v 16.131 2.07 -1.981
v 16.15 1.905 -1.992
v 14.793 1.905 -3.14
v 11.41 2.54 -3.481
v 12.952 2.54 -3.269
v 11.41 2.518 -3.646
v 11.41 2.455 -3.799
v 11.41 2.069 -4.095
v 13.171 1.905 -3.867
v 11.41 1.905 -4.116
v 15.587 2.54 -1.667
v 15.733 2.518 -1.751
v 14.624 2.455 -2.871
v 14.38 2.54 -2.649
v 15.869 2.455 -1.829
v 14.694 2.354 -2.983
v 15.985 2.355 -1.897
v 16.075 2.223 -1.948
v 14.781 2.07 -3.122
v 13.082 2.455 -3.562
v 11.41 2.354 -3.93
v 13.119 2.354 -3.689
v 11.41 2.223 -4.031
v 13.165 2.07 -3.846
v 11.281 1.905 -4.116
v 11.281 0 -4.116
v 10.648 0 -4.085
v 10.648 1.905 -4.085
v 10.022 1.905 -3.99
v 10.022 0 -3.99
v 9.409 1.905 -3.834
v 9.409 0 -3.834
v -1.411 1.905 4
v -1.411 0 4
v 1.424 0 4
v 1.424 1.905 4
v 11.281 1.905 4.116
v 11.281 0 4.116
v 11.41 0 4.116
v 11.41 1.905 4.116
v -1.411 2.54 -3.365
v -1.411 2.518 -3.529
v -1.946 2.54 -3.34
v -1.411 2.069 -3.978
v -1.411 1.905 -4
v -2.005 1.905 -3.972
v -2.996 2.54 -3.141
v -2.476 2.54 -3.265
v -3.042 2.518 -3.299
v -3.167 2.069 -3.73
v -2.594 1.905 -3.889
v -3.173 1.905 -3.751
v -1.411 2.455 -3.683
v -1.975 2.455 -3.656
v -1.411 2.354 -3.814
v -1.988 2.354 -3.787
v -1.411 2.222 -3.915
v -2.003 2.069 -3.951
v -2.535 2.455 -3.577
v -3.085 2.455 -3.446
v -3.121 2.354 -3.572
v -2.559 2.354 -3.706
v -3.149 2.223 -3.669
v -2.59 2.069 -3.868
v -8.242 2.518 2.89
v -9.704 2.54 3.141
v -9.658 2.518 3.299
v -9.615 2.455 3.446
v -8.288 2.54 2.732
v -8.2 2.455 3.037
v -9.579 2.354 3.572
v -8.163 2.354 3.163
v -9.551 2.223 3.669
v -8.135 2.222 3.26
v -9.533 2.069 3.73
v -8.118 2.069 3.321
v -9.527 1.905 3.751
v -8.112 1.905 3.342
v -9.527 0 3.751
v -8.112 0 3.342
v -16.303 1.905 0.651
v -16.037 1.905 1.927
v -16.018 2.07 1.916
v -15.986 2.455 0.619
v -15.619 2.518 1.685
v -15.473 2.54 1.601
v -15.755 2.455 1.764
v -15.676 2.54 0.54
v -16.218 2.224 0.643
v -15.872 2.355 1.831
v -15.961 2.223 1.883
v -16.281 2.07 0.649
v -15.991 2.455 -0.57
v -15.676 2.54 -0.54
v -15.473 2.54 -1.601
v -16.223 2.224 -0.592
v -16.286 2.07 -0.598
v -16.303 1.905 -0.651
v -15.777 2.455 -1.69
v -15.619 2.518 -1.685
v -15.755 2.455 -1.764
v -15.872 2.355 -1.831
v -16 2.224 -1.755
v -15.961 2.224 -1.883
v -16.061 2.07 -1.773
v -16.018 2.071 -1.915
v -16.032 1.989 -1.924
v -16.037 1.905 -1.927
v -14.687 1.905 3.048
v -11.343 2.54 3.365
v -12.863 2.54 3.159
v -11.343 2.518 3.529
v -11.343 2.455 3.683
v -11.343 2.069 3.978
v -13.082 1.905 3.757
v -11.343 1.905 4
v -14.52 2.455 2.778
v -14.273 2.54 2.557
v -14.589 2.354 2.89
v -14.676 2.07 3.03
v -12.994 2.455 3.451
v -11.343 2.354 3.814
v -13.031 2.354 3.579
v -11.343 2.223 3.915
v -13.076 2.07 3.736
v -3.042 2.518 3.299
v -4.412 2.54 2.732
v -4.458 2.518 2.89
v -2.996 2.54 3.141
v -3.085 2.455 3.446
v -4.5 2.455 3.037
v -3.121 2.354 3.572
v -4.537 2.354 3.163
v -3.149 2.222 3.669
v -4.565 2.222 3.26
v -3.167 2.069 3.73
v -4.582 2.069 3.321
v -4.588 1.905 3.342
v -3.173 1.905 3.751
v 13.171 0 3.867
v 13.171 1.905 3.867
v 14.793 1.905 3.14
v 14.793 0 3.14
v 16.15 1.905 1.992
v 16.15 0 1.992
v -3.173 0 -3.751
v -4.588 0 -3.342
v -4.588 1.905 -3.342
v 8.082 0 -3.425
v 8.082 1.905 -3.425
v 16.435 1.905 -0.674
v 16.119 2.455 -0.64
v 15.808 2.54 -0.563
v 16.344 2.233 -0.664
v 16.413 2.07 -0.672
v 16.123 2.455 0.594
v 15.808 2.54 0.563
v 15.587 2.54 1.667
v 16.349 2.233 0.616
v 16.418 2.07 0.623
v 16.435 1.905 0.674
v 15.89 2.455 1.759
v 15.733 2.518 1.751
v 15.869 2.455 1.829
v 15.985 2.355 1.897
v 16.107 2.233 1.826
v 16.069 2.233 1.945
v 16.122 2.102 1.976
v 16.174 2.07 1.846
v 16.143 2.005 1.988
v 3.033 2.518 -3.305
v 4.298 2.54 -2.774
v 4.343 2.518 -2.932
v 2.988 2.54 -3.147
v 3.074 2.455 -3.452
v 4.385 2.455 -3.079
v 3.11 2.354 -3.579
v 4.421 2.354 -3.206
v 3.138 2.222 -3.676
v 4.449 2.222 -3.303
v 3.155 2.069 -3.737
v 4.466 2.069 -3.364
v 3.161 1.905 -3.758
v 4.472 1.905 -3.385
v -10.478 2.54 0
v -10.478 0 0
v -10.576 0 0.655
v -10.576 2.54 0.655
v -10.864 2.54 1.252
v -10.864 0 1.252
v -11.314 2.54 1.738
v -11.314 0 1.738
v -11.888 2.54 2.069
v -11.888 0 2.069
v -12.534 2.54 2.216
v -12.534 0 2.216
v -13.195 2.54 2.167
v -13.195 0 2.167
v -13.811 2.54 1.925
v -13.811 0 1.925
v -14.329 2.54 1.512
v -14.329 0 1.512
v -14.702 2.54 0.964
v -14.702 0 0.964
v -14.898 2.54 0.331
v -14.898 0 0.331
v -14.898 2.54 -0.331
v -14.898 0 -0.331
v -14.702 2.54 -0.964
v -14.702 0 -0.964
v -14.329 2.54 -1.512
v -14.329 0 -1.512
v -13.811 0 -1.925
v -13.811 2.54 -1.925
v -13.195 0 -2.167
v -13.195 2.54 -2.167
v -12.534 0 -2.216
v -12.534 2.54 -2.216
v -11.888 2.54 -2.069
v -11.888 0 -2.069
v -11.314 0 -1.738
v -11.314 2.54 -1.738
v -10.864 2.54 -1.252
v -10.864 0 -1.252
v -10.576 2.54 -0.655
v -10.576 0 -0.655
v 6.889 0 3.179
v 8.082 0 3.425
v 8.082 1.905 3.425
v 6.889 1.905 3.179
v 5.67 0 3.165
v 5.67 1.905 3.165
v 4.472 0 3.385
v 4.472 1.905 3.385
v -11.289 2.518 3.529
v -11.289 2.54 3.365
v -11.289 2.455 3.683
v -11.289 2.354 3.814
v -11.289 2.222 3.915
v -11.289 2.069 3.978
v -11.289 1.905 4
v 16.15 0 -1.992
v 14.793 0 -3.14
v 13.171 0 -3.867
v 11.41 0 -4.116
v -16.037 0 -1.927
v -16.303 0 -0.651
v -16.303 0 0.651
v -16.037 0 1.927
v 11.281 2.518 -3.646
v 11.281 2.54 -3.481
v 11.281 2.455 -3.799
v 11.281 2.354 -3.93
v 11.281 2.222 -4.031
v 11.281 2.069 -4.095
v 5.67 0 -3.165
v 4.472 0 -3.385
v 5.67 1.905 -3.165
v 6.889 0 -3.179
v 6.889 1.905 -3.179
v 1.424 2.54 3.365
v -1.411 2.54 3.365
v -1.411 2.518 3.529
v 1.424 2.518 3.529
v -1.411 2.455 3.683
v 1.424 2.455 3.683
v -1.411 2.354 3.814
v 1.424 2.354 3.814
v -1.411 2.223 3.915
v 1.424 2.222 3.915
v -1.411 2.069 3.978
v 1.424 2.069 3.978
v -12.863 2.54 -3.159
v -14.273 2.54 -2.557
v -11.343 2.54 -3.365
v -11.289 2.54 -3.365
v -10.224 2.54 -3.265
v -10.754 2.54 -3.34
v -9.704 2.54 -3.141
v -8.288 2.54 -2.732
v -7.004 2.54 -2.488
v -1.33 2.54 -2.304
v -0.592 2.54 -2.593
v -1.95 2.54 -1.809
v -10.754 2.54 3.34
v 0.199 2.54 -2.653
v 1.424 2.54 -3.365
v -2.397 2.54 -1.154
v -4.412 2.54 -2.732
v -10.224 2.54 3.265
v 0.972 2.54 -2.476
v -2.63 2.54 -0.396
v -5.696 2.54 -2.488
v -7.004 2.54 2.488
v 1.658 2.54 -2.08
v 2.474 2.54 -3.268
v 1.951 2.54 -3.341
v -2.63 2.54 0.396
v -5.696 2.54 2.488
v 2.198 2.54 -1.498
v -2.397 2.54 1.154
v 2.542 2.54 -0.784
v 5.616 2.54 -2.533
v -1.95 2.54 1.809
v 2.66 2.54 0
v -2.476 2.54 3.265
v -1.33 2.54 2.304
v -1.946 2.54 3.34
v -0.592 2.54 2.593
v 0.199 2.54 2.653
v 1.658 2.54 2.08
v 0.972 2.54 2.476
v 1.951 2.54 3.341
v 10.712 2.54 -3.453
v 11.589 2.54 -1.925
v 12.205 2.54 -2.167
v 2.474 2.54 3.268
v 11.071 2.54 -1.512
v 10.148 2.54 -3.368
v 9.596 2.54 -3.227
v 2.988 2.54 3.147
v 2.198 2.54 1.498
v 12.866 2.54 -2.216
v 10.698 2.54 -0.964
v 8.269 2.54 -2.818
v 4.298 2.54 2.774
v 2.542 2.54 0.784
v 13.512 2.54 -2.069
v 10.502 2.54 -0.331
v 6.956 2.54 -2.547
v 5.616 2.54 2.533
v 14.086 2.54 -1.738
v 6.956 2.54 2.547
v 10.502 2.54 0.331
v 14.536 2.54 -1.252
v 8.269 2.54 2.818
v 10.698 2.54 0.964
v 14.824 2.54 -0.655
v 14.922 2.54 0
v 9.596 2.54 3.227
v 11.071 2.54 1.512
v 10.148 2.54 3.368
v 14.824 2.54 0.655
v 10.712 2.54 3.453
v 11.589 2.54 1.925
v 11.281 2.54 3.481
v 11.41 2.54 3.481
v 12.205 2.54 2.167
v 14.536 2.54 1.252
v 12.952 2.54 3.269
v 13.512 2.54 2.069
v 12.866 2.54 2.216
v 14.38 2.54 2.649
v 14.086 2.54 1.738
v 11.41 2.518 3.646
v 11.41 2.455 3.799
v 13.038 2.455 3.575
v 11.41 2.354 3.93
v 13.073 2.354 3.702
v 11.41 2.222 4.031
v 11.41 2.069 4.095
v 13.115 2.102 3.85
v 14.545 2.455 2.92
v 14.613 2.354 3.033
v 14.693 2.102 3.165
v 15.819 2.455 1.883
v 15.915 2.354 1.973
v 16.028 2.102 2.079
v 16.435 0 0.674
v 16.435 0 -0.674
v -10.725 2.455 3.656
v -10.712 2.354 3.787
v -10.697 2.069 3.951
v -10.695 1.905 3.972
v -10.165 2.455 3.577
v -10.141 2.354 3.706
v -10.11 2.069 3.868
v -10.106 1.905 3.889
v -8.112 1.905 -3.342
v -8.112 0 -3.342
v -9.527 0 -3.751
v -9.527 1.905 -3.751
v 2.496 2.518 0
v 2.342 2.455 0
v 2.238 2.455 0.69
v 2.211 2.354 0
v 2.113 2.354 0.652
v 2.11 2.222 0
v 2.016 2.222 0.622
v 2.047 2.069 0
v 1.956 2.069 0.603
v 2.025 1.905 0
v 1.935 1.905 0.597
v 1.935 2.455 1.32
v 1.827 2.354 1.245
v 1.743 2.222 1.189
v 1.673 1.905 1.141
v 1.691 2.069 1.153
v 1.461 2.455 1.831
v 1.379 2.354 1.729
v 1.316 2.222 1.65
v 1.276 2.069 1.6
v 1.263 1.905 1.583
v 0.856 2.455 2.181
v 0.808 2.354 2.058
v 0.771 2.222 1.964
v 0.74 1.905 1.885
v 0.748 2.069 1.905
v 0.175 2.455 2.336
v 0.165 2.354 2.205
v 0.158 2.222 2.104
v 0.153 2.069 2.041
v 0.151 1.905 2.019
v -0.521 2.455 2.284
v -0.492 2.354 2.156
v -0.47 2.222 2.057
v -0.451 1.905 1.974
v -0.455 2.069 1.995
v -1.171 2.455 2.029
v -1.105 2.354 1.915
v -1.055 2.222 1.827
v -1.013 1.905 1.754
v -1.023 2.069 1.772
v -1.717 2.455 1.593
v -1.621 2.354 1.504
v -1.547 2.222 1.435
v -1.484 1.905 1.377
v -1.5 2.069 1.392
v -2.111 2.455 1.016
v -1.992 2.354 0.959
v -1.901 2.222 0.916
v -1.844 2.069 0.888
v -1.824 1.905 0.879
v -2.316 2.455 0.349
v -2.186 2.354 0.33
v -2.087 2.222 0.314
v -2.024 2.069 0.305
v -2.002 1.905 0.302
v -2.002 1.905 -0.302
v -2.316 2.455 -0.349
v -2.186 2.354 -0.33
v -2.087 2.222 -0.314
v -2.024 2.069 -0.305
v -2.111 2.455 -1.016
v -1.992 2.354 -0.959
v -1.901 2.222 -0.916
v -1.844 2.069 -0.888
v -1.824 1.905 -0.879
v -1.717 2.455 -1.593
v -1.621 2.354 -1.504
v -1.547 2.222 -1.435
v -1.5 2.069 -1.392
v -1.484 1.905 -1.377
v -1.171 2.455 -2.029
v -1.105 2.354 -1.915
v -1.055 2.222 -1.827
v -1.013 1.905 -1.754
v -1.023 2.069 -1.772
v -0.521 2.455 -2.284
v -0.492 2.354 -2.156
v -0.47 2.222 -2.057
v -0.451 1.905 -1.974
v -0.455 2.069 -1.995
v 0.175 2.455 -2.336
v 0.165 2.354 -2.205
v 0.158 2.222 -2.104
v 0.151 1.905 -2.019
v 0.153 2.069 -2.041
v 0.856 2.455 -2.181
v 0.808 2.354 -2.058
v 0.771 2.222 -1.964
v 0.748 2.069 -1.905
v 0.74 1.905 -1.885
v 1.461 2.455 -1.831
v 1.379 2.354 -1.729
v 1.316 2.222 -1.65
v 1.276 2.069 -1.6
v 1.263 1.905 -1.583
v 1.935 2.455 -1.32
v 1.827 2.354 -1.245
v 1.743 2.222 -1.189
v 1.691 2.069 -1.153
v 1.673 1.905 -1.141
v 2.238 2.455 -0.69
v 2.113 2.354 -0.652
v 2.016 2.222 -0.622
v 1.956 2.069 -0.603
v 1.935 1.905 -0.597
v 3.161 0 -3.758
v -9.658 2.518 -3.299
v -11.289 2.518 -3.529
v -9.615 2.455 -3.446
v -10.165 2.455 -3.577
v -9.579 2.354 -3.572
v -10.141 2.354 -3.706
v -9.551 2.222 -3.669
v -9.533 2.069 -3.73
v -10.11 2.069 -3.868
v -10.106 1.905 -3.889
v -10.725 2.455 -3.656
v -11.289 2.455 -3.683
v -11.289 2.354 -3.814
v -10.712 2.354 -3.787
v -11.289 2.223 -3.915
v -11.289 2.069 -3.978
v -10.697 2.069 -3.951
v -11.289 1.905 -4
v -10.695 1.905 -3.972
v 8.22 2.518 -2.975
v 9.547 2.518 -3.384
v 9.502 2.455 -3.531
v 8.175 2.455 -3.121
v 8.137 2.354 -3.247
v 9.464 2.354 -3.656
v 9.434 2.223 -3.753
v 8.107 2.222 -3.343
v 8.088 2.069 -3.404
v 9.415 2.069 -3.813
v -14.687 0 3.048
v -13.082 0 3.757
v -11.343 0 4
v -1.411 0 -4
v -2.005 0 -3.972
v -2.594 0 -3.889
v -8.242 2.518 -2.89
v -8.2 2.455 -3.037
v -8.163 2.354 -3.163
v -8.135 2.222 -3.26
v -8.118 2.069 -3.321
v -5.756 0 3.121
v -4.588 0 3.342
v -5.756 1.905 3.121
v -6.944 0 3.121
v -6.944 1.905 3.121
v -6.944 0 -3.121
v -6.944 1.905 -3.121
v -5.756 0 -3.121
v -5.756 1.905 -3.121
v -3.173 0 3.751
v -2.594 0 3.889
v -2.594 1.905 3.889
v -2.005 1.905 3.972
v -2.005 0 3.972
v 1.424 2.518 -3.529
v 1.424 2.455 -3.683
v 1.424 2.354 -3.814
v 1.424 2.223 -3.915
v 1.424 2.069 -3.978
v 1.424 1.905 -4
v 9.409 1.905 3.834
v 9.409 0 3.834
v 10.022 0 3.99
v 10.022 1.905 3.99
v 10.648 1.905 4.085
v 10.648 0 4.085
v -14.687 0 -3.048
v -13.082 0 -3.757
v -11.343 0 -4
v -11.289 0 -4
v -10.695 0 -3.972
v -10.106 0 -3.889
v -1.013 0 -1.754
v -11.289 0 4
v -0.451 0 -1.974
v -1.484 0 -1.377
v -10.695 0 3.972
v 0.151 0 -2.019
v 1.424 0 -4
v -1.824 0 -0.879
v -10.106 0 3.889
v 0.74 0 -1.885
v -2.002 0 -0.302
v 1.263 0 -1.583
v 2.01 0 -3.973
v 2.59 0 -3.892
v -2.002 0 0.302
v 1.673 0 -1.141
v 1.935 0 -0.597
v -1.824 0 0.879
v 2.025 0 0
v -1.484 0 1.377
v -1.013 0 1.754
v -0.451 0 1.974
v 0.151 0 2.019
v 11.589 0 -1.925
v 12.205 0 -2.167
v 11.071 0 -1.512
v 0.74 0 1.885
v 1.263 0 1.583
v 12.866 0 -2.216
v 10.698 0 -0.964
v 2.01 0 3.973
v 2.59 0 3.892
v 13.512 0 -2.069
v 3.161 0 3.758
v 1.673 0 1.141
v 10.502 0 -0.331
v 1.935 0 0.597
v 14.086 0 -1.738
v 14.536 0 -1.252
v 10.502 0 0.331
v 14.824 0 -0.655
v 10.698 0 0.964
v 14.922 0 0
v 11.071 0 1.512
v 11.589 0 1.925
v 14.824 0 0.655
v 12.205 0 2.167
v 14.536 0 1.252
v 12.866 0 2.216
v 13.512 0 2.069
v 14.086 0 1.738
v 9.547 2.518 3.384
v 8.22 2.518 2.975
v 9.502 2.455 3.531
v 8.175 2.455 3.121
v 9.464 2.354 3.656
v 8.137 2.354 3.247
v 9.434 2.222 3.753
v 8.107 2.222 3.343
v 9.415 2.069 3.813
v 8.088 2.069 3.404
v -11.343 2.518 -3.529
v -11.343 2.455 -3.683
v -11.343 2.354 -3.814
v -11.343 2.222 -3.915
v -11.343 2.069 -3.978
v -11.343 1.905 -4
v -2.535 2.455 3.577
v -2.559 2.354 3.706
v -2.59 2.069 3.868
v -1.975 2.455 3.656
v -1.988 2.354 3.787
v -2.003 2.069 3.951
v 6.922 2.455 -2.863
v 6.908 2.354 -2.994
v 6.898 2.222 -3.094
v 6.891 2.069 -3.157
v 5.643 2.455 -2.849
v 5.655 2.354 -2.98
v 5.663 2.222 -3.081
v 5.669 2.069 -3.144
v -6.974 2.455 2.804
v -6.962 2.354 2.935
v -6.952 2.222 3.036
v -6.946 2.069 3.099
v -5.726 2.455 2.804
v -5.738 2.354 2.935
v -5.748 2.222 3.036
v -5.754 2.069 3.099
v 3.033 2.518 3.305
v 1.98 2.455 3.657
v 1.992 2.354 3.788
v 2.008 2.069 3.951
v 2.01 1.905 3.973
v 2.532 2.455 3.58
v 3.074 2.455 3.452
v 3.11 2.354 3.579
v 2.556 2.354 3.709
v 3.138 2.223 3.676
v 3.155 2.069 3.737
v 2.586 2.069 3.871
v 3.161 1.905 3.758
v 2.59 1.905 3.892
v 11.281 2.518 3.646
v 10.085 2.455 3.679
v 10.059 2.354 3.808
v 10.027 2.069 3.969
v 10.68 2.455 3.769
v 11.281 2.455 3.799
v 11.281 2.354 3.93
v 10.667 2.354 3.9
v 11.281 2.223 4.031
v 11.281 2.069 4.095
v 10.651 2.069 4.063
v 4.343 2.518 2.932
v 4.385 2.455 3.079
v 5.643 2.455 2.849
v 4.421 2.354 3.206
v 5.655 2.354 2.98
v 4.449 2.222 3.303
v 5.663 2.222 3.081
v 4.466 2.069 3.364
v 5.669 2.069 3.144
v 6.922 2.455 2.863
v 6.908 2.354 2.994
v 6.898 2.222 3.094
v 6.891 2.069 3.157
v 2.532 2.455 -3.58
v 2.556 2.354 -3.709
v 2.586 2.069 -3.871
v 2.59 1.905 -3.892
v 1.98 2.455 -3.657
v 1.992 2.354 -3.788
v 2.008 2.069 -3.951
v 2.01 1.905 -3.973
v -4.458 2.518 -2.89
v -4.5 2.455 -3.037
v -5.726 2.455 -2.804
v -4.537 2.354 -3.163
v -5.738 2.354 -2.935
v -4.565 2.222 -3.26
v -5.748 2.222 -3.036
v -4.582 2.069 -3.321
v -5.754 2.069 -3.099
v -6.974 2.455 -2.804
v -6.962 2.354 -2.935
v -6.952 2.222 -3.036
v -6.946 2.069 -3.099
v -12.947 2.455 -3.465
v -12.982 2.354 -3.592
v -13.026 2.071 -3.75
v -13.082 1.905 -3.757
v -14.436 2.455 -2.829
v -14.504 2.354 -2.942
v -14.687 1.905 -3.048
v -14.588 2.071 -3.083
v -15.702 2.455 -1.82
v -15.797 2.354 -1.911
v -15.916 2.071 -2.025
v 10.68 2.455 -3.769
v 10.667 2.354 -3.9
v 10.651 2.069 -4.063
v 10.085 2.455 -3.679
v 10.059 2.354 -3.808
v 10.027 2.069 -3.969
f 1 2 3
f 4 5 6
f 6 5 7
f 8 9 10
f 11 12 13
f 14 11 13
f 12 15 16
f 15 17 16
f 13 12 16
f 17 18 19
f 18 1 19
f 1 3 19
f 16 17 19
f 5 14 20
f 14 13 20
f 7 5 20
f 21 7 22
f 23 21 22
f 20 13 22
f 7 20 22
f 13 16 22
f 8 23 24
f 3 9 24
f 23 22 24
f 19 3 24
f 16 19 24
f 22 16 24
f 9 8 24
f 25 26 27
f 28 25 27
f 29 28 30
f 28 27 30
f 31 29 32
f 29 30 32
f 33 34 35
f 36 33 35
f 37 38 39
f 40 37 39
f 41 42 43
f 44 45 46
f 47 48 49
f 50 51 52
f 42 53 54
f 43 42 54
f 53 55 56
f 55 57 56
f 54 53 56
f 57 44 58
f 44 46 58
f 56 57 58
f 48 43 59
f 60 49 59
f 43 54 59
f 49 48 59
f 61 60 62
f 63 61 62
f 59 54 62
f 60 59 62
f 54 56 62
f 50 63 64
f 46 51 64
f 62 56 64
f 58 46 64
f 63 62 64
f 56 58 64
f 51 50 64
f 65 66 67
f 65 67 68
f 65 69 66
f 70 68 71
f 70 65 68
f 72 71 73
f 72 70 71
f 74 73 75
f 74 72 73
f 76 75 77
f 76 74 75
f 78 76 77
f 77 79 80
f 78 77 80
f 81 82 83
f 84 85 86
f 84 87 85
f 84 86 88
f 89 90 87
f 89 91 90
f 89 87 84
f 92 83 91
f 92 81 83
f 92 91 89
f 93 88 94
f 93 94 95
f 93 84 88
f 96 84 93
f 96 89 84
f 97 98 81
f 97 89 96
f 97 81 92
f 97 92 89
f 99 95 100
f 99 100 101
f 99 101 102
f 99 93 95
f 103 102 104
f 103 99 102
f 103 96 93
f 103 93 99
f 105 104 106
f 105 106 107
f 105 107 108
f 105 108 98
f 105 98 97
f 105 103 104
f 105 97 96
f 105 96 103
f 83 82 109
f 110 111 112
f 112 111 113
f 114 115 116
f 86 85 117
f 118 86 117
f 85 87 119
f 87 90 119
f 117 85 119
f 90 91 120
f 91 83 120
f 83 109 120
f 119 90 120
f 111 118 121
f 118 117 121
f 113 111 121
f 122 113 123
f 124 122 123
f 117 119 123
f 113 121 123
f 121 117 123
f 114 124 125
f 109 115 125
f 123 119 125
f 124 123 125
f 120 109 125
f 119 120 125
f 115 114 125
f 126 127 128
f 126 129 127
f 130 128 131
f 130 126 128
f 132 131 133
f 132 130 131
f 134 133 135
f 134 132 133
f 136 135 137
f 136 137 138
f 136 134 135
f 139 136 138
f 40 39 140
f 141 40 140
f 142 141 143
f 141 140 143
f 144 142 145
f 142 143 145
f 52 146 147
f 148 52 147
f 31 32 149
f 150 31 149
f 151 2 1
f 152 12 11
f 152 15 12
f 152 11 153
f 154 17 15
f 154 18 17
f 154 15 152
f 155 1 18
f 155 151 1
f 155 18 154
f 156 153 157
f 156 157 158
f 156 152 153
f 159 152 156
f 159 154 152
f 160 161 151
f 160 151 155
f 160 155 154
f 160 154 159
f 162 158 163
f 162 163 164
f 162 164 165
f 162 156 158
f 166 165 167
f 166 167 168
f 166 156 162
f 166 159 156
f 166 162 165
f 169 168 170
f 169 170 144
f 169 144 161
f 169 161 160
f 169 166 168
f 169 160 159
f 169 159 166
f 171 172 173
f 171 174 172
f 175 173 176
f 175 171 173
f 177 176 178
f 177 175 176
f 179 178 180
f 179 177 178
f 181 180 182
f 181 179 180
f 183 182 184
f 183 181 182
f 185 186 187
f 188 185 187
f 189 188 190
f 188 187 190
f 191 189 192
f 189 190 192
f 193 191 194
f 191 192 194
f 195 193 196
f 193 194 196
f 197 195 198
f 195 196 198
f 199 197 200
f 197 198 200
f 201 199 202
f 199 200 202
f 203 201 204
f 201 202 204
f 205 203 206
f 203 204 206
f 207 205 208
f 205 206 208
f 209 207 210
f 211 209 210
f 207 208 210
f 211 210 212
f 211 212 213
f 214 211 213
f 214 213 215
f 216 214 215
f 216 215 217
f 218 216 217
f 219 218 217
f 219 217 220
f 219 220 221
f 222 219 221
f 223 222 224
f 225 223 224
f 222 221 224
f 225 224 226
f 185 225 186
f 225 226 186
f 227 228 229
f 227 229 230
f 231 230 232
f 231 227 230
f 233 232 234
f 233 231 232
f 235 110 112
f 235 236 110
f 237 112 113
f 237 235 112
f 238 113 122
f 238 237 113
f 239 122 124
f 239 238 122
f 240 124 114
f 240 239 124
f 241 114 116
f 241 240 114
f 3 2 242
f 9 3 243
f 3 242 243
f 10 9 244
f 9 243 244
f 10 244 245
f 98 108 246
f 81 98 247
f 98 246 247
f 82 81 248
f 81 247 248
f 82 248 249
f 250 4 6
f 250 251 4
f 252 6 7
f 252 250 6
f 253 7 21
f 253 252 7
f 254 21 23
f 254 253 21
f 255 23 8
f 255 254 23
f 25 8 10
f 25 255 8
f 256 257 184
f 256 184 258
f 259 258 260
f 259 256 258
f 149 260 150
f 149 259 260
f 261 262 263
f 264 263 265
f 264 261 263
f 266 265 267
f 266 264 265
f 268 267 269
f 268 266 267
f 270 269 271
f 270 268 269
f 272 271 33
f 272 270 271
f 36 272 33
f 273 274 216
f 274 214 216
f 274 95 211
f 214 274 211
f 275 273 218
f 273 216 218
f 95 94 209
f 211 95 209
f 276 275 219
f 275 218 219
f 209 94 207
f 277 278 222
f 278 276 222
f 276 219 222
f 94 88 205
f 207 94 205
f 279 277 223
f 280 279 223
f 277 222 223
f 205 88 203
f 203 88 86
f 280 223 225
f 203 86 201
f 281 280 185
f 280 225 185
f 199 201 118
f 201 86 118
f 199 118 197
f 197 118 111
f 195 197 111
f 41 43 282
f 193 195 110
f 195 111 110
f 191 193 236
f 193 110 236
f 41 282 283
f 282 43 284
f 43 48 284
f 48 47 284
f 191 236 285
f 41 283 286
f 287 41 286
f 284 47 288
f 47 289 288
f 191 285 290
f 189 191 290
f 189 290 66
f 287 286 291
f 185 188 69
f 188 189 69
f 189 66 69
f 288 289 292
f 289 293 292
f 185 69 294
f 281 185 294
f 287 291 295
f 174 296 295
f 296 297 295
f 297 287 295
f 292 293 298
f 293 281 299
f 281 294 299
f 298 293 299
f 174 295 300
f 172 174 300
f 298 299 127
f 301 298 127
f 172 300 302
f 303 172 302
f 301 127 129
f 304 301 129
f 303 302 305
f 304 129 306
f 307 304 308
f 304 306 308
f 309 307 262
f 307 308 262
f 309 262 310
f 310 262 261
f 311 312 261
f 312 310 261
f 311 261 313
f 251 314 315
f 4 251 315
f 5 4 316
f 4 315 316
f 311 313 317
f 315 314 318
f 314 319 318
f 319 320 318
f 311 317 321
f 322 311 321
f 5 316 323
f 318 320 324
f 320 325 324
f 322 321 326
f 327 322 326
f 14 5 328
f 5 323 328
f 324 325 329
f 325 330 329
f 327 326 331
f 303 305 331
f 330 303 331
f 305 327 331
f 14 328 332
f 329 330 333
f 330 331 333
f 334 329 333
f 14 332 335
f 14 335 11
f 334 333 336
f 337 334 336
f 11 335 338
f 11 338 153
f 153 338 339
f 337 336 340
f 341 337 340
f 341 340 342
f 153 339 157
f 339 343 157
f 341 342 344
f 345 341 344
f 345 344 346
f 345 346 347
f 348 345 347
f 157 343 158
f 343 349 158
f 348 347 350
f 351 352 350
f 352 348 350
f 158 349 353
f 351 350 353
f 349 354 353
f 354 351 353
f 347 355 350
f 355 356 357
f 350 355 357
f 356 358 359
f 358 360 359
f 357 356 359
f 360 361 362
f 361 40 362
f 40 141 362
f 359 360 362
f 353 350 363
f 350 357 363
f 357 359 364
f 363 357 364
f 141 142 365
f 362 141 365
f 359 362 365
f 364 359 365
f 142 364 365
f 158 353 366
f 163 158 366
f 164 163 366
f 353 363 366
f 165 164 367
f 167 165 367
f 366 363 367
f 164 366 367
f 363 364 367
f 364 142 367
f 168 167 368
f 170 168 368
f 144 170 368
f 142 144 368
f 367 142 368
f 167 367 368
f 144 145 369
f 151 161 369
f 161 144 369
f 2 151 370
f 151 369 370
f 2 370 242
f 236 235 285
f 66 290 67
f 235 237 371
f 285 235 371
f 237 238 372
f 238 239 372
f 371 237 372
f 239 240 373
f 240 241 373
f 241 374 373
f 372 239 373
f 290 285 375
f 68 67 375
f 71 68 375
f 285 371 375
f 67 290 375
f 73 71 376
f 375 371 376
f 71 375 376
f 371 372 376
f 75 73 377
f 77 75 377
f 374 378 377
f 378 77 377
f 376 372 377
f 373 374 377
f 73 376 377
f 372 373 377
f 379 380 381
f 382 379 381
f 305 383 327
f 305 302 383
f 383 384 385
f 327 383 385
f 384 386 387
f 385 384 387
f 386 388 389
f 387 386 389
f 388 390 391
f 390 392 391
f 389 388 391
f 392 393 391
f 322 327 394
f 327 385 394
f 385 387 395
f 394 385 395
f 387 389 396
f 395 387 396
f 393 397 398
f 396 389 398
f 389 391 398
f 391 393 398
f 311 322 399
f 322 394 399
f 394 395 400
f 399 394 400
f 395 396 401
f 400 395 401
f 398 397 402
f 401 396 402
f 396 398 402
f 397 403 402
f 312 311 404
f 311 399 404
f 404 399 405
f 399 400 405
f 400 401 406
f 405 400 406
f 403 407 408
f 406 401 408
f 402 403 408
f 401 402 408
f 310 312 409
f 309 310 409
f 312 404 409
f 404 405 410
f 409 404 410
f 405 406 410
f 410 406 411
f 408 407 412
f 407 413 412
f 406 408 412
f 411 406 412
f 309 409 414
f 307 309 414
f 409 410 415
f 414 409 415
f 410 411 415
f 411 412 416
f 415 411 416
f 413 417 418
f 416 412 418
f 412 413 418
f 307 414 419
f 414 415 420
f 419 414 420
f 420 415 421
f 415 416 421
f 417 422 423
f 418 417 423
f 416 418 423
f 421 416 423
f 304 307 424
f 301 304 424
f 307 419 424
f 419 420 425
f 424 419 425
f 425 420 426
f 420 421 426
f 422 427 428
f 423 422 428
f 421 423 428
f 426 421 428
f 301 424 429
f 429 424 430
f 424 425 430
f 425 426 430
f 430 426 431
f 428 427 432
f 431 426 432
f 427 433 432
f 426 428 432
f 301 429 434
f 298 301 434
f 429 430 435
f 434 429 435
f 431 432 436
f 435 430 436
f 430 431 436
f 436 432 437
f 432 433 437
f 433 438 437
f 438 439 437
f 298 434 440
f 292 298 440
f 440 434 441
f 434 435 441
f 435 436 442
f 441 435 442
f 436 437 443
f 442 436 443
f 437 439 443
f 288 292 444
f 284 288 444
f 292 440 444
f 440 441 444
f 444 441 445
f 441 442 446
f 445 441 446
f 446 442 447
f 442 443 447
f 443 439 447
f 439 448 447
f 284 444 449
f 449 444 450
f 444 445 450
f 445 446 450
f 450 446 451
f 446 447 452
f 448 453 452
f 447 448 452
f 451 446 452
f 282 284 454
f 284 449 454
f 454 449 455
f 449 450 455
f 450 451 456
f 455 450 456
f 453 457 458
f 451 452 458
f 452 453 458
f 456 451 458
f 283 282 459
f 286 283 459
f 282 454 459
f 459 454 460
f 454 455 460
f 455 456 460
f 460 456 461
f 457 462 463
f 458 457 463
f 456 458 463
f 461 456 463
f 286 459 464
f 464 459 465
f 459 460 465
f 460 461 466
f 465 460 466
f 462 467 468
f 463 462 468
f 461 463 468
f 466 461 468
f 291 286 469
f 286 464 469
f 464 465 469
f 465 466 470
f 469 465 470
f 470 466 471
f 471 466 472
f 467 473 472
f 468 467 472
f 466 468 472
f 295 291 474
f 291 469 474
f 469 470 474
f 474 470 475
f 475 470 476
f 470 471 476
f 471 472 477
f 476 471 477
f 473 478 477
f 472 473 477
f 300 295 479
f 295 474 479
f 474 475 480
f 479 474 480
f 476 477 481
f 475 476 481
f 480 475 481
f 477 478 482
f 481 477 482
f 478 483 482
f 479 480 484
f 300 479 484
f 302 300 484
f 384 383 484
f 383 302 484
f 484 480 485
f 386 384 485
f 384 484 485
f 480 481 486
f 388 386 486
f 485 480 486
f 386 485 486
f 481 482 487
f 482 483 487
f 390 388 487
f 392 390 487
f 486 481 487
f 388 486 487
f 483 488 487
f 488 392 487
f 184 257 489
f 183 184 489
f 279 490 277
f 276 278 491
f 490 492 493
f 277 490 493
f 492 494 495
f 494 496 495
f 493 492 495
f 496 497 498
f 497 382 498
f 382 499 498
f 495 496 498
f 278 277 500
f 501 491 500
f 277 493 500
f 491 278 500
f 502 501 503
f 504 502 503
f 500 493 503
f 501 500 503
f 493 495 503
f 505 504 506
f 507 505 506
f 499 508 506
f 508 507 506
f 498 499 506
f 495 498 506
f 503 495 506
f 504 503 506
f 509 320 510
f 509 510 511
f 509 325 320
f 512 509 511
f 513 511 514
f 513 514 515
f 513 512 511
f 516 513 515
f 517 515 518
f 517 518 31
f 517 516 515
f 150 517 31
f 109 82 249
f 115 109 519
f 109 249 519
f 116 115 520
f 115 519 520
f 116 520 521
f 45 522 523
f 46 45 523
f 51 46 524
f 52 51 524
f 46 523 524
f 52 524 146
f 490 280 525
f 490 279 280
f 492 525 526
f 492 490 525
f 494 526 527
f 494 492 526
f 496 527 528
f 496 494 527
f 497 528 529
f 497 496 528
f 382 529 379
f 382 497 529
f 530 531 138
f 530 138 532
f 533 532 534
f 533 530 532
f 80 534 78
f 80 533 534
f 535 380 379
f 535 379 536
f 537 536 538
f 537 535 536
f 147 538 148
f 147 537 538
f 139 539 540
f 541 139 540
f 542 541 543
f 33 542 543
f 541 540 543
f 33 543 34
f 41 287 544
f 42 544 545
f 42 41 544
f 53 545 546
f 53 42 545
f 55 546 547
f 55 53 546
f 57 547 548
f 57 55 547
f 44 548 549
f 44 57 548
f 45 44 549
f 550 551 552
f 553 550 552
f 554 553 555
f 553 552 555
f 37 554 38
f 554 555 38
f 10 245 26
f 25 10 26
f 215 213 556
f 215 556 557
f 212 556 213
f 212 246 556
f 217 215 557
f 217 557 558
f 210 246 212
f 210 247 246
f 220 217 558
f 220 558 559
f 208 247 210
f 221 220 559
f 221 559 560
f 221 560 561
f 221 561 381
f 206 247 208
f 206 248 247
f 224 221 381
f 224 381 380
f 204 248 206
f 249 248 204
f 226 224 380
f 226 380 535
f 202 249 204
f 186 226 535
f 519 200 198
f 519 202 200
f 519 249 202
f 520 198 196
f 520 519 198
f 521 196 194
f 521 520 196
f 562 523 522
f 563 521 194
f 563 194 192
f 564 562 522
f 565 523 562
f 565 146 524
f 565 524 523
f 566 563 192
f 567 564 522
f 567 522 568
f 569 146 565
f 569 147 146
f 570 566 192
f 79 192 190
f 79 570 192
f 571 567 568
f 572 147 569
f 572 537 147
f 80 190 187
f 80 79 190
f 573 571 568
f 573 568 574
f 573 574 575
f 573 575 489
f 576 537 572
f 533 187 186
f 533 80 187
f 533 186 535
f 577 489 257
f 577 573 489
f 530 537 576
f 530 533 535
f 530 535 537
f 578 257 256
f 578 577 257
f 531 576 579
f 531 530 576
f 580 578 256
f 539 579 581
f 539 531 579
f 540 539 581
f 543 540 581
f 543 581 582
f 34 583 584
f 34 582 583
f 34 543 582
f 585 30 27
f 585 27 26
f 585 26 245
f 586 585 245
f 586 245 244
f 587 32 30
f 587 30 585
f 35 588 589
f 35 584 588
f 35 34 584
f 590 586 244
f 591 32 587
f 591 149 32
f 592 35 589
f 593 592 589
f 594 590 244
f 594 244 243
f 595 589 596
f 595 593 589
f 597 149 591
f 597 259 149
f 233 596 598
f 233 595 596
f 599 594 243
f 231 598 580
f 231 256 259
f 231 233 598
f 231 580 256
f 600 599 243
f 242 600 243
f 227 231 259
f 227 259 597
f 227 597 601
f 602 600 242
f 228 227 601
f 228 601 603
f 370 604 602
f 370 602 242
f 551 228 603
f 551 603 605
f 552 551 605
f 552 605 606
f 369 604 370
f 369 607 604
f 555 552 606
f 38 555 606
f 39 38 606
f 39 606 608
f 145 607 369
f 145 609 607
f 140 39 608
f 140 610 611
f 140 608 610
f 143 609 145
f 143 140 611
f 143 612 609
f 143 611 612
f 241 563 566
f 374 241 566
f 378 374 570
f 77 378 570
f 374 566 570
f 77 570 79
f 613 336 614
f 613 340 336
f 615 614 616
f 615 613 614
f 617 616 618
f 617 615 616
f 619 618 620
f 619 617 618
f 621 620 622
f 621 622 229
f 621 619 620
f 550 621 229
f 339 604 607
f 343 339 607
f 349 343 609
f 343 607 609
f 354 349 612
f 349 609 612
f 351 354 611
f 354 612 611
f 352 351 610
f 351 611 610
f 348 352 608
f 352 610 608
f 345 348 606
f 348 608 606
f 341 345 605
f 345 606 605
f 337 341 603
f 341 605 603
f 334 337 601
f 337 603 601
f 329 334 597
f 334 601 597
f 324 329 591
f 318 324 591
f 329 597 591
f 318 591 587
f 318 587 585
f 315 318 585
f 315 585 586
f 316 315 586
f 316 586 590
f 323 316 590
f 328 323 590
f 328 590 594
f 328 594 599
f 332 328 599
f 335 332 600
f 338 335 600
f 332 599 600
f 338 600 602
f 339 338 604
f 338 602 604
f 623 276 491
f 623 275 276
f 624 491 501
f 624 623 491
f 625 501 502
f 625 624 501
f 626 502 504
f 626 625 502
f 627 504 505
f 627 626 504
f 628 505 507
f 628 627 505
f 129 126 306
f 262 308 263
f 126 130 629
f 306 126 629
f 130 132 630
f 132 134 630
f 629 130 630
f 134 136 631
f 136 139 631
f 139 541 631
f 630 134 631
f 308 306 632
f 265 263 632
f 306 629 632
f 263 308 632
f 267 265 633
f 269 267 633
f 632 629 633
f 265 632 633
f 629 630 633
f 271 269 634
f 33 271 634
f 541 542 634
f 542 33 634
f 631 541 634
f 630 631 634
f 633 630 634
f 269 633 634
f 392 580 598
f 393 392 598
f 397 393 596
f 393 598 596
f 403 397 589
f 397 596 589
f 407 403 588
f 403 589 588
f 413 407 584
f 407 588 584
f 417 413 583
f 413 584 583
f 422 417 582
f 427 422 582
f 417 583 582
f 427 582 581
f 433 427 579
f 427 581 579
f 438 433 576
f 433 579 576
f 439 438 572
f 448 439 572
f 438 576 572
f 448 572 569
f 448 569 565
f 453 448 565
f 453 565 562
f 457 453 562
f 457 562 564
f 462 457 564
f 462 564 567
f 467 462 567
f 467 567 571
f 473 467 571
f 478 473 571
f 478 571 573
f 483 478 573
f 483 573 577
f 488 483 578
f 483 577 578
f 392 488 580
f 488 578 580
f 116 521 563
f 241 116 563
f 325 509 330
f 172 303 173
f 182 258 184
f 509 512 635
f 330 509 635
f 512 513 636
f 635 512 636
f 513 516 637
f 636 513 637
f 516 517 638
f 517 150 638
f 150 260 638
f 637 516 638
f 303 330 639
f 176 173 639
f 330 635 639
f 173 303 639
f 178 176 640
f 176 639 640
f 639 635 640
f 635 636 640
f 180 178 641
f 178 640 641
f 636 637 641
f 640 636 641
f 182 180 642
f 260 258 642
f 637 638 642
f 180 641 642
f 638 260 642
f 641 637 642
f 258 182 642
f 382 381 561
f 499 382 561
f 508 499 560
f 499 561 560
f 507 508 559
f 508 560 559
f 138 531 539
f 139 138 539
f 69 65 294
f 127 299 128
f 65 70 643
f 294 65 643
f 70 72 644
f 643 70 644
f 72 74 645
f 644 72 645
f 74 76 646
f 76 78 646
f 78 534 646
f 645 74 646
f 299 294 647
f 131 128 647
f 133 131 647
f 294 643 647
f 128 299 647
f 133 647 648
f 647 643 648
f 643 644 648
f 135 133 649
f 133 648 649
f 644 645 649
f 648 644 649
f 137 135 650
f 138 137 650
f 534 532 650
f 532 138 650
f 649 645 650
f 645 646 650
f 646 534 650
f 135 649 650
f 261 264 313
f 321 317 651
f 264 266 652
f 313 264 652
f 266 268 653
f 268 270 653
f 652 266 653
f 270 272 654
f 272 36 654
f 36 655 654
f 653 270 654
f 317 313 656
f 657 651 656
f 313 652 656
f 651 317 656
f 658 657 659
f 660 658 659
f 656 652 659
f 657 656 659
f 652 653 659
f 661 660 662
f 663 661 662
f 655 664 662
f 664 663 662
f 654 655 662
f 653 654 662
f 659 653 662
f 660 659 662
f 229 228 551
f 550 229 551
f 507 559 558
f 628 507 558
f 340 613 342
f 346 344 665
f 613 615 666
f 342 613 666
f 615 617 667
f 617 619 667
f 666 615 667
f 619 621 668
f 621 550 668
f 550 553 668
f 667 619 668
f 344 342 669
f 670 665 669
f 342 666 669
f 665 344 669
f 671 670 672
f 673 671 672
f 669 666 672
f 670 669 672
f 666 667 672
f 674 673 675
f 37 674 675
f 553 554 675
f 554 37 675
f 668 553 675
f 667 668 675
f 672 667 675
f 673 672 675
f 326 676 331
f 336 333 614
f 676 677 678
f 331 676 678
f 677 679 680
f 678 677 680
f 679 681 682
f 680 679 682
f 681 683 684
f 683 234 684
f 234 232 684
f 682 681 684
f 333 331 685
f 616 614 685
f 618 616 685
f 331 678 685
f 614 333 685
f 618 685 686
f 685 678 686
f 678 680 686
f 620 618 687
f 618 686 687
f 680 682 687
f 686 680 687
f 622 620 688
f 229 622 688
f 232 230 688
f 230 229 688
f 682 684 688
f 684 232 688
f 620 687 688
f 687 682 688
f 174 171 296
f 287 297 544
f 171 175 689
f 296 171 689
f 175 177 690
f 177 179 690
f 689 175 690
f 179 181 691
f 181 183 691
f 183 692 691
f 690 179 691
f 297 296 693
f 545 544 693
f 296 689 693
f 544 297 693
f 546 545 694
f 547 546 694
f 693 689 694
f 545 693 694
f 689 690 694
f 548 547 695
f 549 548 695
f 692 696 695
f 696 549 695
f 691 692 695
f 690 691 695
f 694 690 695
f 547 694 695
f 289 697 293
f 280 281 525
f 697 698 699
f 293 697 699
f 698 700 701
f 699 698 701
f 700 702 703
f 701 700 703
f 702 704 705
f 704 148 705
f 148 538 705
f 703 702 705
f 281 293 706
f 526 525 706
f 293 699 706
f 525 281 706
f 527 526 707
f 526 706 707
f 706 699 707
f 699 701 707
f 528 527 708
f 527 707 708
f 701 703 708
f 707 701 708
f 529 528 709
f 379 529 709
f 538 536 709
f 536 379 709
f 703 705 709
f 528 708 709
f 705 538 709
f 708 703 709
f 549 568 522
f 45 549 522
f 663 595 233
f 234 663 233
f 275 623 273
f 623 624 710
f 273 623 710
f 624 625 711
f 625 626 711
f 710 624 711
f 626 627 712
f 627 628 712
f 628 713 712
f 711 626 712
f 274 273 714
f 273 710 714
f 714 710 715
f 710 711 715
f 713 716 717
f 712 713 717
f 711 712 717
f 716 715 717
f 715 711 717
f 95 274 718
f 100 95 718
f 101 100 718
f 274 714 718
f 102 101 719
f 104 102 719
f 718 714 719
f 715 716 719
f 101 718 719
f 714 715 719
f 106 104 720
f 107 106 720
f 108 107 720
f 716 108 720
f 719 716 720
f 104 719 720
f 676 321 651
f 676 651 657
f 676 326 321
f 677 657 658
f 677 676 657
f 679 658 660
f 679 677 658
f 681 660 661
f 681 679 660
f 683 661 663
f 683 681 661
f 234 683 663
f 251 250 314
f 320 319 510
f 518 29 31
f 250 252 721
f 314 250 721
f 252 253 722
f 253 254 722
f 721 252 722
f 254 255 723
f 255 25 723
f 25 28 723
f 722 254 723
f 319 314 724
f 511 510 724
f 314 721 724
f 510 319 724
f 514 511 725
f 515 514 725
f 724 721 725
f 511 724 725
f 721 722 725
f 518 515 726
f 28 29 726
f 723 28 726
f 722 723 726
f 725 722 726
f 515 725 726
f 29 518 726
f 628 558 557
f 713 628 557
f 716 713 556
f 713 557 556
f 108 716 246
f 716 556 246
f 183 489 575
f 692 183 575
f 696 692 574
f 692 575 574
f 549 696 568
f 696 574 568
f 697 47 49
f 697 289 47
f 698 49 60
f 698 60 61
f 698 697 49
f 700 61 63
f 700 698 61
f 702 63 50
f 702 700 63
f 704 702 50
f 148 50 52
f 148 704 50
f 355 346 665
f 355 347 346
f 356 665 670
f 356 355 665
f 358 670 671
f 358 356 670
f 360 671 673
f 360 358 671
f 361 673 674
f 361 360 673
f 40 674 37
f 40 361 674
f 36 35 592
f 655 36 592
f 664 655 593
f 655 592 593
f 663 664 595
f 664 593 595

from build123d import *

# Parameters (mm, degrees)
BOSS_EXTRUDE3_DEPTH = 2.54
FILLET1_R           = 6.35
FILLET2_R           = 0.635


with BuildPart() as part:
    # Sketch2 → Boss-Extrude3 (new body)
    with BuildSketch(Plane(origin=(0, 0, 0), x_dir=(1, 0, 0), z_dir=(0, 1, 0))):
        with BuildLine():
            ThreePointArc((-14.9225, 0), (-12.7, 2.2225), (-10.4775, 0))
            Line((-10.4775, 0), (-8.081142289, 0))
            Line((-8.081142289, 0), (-9.450372471, 2.371576242))
            Line((-9.450372471, 2.371576242), (-10.390571145, 4.000048114))
            Line((-10.390571145, 4.000048114), (-15.009428855, 4.000048114))
            Line((-15.009428855, 4.000048114), (-17.318857711, 0))
            Line((-17.318857711, 0), (-14.9225, 0))
        make_face()
        with BuildLine():
            Line((-8.081142289, 0), (-10.4775, 0))
            ThreePointArc((-10.4775, 0), (-12.7, -2.2225), (-14.9225, 0))
            Line((-14.9225, 0), (-17.318857711, 0))
            Line((-17.318857711, 0), (-15.009428855, -4.000048114))
            Line((-15.009428855, -4.000048114), (-10.390571145, -4.000048114))
            Line((-10.390571145, -4.000048114), (-9.235856717, -2.000024057))
            Line((-9.235856717, -2.000024057), (-8.081142289, 0))
        make_face()
        Polygon((-9.450372471, 2.371576242), (-8.081142289, 0), (-4.618857711, 0), (-3.464143283, 2.000024057), (-2.309428855, 4.000048114), (-6.35, 2.833322689), (-10.390571145, 4.000048114), align=None)
        Polygon((-4.618857711, 0), (-8.081142289, 0), (-9.235856717, -2.000024057), (-10.390571145, -4.000048114), (-6.35, -2.833322689), (-2.309428855, -4.000048114), (-3.464143283, -2.000024057), align=None)
        with BuildLine():
            Line((-3.464143283, 2.000024057), (-4.618857711, 0))
            Line((-4.618857711, 0), (-2.025, 0))
            ThreePointArc((-2.025, 0), (0, 2.025), (2.025, 0))
            Line((2.025, 0), (4.618857711, 0))
            Line((4.618857711, 0), (3.464143283, 2.000024057))
            Line((3.464143283, 2.000024057), (2.309428855, 4.000048114))
            Line((2.309428855, 4.000048114), (-2.309428855, 4.000048114))
            Line((-2.309428855, 4.000048114), (-3.464143283, 2.000024057))
        make_face()
        with BuildLine():
            Line((-2.025, 0), (-4.618857711, 0))
            Line((-4.618857711, 0), (-3.464143283, -2.000024057))
            Line((-3.464143283, -2.000024057), (-2.309428855, -4.000048114))
            Line((-2.309428855, -4.000048114), (2.309428855, -4.000048114))
            Line((2.309428855, -4.000048114), (3.464143283, -2.000024057))
            Line((3.464143283, -2.000024057), (4.618857711, 0))
            Line((4.618857711, 0), (2.025, 0))
            ThreePointArc((2.025, 0), (0, -2.025), (-2.025, 0))
        make_face()
        Polygon((3.464143283, 2.000024057), (4.618857711, 0), (7.946932116, 0), (9.135199087, 2.058138767), (10.323466058, 4.116277534), (6.282791089, 2.86963953), (2.309428855, 4.000048114), align=None)
        Polygon((7.946932116, 0), (4.618857711, 0), (3.464143283, -2.000024057), (2.309428855, -4.000048114), (6.282791089, -2.86963953), (10.323466058, -4.116277534), (9.135199087, -2.058138767), align=None)
        with BuildLine():
            Line((9.135199087, 2.058138767), (7.946932116, 0))
            Line((7.946932116, 0), (10.4775, 0))
            ThreePointArc((10.4775, 0), (12.7, 2.2225), (14.9225, 0))
            Line((14.9225, 0), (17.453067884, 0))
            Line((17.453067884, 0), (15.076533942, 4.116277534))
            Line((15.076533942, 4.116277534), (10.323466058, 4.116277534))
            Line((10.323466058, 4.116277534), (9.135199087, 2.058138767))
        make_face()
        with BuildLine():
            Line((10.4775, 0), (7.946932116, 0))
            Line((7.946932116, 0), (9.135199087, -2.058138767))
            Line((9.135199087, -2.058138767), (10.323466058, -4.116277534))
            Line((10.323466058, -4.116277534), (15.076533942, -4.116277534))
            Line((15.076533942, -4.116277534), (17.453067884, 0))
            Line((17.453067884, 0), (14.9225, 0))
            ThreePointArc((14.9225, 0), (12.7, -2.2225), (10.4775, 0))
        make_face()
    extrude(amount=BOSS_EXTRUDE3_DEPTH)

    # Fillet1
    # the kernel refuses this fillet: 6.35 mm, written as the material it adds along each edge
    with BuildSketch(Plane(origin=(-6.35, 0, -2.833322689), x_dir=(-0.9607490883142406, 0, -0.2774187976748433), z_dir=(0, 1, 0)), Plane(origin=(-6.35, 0, 2.833322689), x_dir=(0.9607490883142819, 0, 0.27741879767470035), z_dir=(0, 1, 0))) as fillet1_piece_1:
        with BuildLine():
            CenterArc((FILLET1_R * 0.288752600496, -FILLET1_R), FILLET1_R, 90, 32.212421432)
            Line((-FILLET1_R * 0.244307113399, -FILLET1_R * 0.153922378607), (0, 0))
            Line((0, 0), (FILLET1_R * 0.288752600496, 0))
        make_face()
    extrude(amount=2.54)
    with BuildSketch(Plane(origin=(6.282791089, 0, -2.86963953), x_dir=(-0.9618326798752038, 0, -0.27363825742041953), z_dir=(0, 1, 0)), Plane(origin=(6.282791089, 0, 2.86963953), x_dir=(0.9555558296704232, 0, 0.2948102040005893), z_dir=(0, 1, 0))) as fillet1_piece_2:
        with BuildLine():
            CenterArc((FILLET1_R * 0.296470151245, -FILLET1_R), FILLET1_R, 90, 33.027036352)
            Line((-FILLET1_R * 0.248564569422, -FILLET1_R * 0.16158652607), (0, 0))
            Line((0, 0), (FILLET1_R * 0.296470151245, 0))
        make_face()
    extrude(amount=2.54)
    # the kernel refuses this fillet: 6.35 mm, written as the material it takes off along each edge
    with BuildSketch(Plane(origin=(-10.390571145, -2.246092292, -4.000048114), x_dir=(-1, 0, 0), z_dir=(0, 1, 0))) as fillet1_2_piece_1:
        with BuildLine():
            CenterArc((FILLET1_R * 0.141486128607, FILLET1_R), FILLET1_R, 253.893789284, 16.106210716)
            Line((-FILLET1_R * 0.135932669068, FILLET1_R * 0.0392509116858), (0, 0))
            Line((0, 0), (FILLET1_R * 0.141486128607, 0))
        make_face()
    extrude(amount=7.032184583, mode=Mode.SUBTRACT)
    with BuildSketch(Plane(origin=(-2.309428855, -2.246092292, -4.000048114), x_dir=(1, 0, 0), z_dir=(0, 1, 0)), Plane(origin=(-2.309428855, -2.246092292, 4.000048114), x_dir=(-0.9607490883142817, 0, -0.2774187976747005), z_dir=(0, 1, 0)), Plane(origin=(-10.390571145, -2.246092292, 4.000048114), x_dir=(-1, 0, 0), z_dir=(0, 1, 0))) as fillet1_2_piece_2:
        with BuildLine():
            CenterArc((FILLET1_R * 0.141486128607, -FILLET1_R), FILLET1_R, 90, 16.106210716)
            Line((-FILLET1_R * 0.135932669068, -FILLET1_R * 0.0392509116857), (0, 0))
            Line((0, 0), (FILLET1_R * 0.141486128607, 0))
        make_face()
    extrude(amount=7.032184583, mode=Mode.SUBTRACT)
    with BuildSketch(Plane(origin=(2.309428855, -2.214259851, -4.000048114), x_dir=(0.9618326798752038, 0, 0.27363825742041936), z_dir=(0, 1, 0)), Plane(origin=(2.309428855, -2.214259851, 4.000048114), x_dir=(-1, 0, 0), z_dir=(0, 1, 0))) as fillet1_2_piece_3:
        with BuildLine():
            CenterArc((FILLET1_R * 0.139480935468, -FILLET1_R), FILLET1_R, 90, 15.880879627)
            Line((-FILLET1_R * 0.134157321953, -FILLET1_R * 0.0381673201248), (0, 0))
            Line((0, 0), (FILLET1_R * 0.139480935468, 0))
        make_face()
    extrude(amount=6.968519701, mode=Mode.SUBTRACT)
    with BuildSketch(Plane(origin=(10.323466058, -2.39323875, -4.116277534), x_dir=(1, 0, 0), z_dir=(0, 1, 0)), Plane(origin=(10.323466058, -2.39323875, 4.116277534), x_dir=(-0.9555558296704234, 0, -0.294810204000589), z_dir=(0, 1, 0))) as fillet1_2_piece_4:
        with BuildLine():
            CenterArc((FILLET1_R * 0.150755196823, -FILLET1_R), FILLET1_R, 90, 17.146156725)
            Line((-FILLET1_R * 0.144055007178, -FILLET1_R * 0.0444441703296), (0, 0))
            Line((0, 0), (FILLET1_R * 0.150755196823, 0))
        make_face()
    extrude(amount=7.326477499, mode=Mode.SUBTRACT)
    with BuildSketch(Plane(origin=(15.076533942, -9.165435523, -4.116277534), x_dir=(0.500000000000005, 0, 0.8660254037844358), z_dir=(0, 1, 0)), Plane(origin=(17.453067884, -9.165435523, 0), x_dir=(-0.49999999999999534, 0, 0.8660254037844413), z_dir=(0, 1, 0)), Plane(origin=(15.076533942, -9.165435523, 4.116277534), x_dir=(-1, 0, 0), z_dir=(0, 1, 0)), Plane(origin=(-15.009428855, -9.165435523, 4.000048114), x_dir=(-0.5000000000000033, 0, -0.8660254037844367), z_dir=(0, 1, 0)), Plane(origin=(-17.318857711, -9.165435523, 0), x_dir=(0.4999999999999972, 0, -0.8660254037844403), z_dir=(0, 1, 0)), Plane(origin=(-15.009428855, -9.165435523, -4.000048114), x_dir=(1, 0, 0), z_dir=(0, 1, 0))) as fillet1_2_piece_5:
        with BuildLine():
            CenterArc((FILLET1_R * 0.57735026919, -FILLET1_R), FILLET1_R, 90, 60)
            Line((-FILLET1_R * 0.288675134595, -FILLET1_R * 0.5), (0, 0))
            Line((0, 0), (FILLET1_R * 0.57735026919, 0))
        make_face()
    extrude(amount=20.870871047, mode=Mode.SUBTRACT)

    # Fillet2
    fillet2_edges = [part.edges().sort_by_distance(p)[0] for p in [
        (-2.025, 2.54, 0),
        (-8.819504031, 2.54, -3.546398399),
        (8.745211682, 2.54, 3.629350993),
        (11.345560645, 2.54, 4.116277534),
        (11.345560645, 2.54, -4.116277534),
        (8.745211682, 2.54, -3.629350993),
        (3.81669336, 2.54, -3.571236283),
        (0.006366488, 2.54, -4.000048114),
        (-3.880495969, 2.54, -3.546398399),
        (-11.316131354, 2.54, 4.000048114),
        (-8.819504031, 2.54, 3.546398399),
        (-3.880495969, 2.54, 3.546398399),
        (0.006366488, 2.54, 4.000048114),
        (3.81669336, 2.54, 3.571236283),
        (-13.908962899, 2.54, -3.458631518),
        (-16.336509292, 2.54, 0),
        (-13.908962899, 2.54, 3.458631518),
        (-10.399430946, 2.54, 3.937428535),
        (-2.300569054, 2.54, 3.937428535),
        (2.30093691, 2.54, 3.939165629),
        (10.334162366, 2.54, 4.045326026),
        (14.007411183, 2.54, 3.560915034),
        (16.470719465, 2.54, 0),
        (14.007411183, 2.54, -3.560915034),
        (10.334162366, 2.54, -4.045326026),
        (2.30093691, 2.54, -3.939165629),
        (-2.300569054, 2.54, -3.937428535),
        (-10.399430946, 2.54, -3.937428535),
        (-6.35, 2.54, -3.092748685),
        (6.279774704, 2.54, -3.142811536),
        (6.279774704, 2.54, 3.142811536),
        (-6.35, 2.54, 3.092748685),
        (-11.316131354, 2.54, -4.000048114),
    ]]
    fillet(fillet2_edges, radius=FILLET2_R)


solid = part.part
